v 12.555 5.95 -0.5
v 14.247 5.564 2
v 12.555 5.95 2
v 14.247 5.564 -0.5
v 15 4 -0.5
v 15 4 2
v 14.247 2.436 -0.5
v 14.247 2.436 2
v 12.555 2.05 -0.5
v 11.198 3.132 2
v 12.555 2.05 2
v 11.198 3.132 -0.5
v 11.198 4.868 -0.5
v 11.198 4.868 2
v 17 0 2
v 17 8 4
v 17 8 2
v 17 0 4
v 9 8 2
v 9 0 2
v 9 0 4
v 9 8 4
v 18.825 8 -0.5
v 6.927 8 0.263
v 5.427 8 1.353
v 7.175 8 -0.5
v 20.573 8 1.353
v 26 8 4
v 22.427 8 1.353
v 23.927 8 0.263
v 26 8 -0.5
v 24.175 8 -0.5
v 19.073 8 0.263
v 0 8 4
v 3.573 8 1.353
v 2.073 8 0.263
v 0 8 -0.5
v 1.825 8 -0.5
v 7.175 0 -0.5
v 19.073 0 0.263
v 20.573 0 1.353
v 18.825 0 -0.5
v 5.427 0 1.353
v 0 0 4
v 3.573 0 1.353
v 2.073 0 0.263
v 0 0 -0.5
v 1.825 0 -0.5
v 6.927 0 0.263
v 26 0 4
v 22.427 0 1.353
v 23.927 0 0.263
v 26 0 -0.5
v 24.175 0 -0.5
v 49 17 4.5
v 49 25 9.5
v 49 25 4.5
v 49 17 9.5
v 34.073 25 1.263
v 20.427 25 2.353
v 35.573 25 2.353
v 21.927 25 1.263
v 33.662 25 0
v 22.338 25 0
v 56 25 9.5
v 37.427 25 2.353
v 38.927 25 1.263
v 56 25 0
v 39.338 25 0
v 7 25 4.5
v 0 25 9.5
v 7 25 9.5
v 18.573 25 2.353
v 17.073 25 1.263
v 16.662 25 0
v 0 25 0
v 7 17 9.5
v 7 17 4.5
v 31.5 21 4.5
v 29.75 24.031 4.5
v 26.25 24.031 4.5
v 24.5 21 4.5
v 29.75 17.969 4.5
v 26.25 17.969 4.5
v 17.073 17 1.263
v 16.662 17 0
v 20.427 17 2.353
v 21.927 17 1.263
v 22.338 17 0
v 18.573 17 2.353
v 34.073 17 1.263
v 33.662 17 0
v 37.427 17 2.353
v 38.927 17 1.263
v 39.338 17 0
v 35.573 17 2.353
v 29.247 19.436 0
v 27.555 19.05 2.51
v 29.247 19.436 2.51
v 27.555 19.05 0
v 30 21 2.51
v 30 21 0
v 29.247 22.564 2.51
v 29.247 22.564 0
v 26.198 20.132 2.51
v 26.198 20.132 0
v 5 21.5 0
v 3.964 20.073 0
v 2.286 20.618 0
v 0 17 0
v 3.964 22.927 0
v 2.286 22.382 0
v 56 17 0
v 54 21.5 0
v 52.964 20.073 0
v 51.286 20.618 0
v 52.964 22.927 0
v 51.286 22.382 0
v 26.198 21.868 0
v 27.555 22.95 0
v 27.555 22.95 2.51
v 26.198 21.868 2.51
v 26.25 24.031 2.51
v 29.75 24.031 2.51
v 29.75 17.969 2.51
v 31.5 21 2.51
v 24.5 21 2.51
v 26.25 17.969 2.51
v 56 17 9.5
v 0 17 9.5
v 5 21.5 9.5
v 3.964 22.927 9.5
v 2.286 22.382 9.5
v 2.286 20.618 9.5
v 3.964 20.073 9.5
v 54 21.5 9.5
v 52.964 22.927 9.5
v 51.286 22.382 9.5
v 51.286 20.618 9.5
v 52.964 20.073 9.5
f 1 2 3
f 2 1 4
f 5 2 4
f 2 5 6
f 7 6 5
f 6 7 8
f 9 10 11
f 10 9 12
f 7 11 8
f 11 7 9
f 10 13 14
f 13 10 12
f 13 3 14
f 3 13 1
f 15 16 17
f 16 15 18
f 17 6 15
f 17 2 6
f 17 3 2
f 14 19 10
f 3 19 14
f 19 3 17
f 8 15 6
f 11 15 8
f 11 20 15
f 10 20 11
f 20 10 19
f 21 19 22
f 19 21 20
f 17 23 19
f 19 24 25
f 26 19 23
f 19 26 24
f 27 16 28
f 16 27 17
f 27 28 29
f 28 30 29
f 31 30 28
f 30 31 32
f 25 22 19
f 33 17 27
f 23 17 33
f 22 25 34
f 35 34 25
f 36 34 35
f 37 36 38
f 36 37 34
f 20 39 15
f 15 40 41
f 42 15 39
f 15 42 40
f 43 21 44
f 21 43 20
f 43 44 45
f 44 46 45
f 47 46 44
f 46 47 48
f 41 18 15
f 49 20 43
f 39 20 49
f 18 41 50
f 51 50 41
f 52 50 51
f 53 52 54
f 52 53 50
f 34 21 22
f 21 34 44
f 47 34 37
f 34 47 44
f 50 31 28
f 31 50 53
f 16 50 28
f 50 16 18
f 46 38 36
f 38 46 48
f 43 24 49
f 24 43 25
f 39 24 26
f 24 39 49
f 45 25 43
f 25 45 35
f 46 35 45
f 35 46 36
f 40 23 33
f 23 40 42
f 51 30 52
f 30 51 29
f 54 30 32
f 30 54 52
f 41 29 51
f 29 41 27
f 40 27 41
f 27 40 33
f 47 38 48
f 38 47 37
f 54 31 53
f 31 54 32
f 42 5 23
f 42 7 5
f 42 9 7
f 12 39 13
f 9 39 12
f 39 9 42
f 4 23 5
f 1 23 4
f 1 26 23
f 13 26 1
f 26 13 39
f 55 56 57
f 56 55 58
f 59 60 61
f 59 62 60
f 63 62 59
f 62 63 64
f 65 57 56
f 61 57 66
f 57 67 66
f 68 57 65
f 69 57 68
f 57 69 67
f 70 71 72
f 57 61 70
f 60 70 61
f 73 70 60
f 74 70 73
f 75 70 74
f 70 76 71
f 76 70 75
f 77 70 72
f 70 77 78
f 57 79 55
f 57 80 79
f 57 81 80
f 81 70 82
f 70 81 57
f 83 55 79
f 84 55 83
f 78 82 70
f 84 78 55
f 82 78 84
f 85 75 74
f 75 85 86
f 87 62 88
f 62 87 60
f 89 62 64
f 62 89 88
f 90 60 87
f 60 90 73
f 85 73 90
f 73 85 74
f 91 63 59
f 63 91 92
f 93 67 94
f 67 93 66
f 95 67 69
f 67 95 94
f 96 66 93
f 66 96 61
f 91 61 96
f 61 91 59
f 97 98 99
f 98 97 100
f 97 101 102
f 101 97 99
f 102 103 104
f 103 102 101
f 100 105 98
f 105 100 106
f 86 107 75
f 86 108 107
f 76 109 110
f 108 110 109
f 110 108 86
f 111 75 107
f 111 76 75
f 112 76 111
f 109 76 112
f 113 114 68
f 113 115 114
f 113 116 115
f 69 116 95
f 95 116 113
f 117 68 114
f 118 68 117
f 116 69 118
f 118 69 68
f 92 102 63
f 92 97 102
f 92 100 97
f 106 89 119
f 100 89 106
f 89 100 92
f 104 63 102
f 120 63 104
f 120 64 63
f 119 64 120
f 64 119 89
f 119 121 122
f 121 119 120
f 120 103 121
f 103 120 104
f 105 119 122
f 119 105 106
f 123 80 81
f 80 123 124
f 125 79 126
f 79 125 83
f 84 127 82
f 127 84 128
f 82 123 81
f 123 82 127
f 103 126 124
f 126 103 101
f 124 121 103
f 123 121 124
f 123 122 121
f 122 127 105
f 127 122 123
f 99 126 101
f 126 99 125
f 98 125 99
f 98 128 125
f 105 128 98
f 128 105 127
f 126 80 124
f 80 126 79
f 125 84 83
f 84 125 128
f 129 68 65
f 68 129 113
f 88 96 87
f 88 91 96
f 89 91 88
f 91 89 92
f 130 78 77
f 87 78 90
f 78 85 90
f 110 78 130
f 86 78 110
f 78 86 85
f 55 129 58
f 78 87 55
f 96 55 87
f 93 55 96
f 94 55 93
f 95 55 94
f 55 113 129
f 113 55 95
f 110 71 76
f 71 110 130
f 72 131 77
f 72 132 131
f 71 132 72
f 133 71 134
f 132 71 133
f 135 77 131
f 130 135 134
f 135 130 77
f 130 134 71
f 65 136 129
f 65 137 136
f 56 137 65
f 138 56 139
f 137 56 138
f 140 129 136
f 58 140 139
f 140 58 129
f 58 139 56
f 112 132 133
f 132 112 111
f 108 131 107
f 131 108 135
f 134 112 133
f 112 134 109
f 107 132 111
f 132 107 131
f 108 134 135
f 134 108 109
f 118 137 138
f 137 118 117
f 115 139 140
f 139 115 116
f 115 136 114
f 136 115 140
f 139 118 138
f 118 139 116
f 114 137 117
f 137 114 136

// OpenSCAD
union(){
translate([0,0,-1])
    top(3,3);
translate([0,25,0])
    rotate([90,0,0])
    bottom2(3,2,2,49);
}



screwSize=4;
railWidth=75;
railSize=5;
screwSpace=2;
mountHeight=3;
railBlockLength=railSize+2*screwSpace;
screwAreaLength=screwSize+2*screwSpace;
topLength=2*railBlockLength+screwAreaLength;
mountItemSize=screwAreaLength;


module top(d,l){
    difference(){
        cube([topLength,screwAreaLength,screwAreaLength]);
        union(){
            translate([railBlockLength+screwAreaLength/2,screwAreaLength/2,0])
                cylinder(d=screwSize,h=mountHeight*2);
            
            translate([railBlockLength,0,3])
                cube([screwAreaLength,screwAreaLength,screwAreaLength]);
            
            translate([0,0,5])
                cube([railBlockLength,screwAreaLength,screwAreaLength-1]);
            
            translate([railBlockLength+screwAreaLength,0,5])
                cube([railBlockLength,screwAreaLength,screwAreaLength-1]);
            
            translate([railSize/2+screwSpace,screwAreaLength,-0.5])
                rotate([90,0,0])
                cylinder(d=railSize+1,h=10);
            
            translate([topLength-railSize/2-screwSpace,screwAreaLength,-0.5])
                rotate([90,0,0])
                cylinder(d=railSize+1,h=10);
            
            cube([topLength,screwAreaLength,0.5]);
        }
    }
}

module bottom2(d,l,r,pl){
    
    bl=pl+d+2*l;
    mh=railSize/2+screwSpace;
    
    echo(bl);
    difference(){
        difference(){
            cube([bl,mh+5,screwAreaLength]);
            
            union(){
                           
                
                translate([d+l+r,mh,0])
                    cube([bl-2*(d+l+r),topLength,topLength]);
                
                
                *translate([topLength,mountHeight,0])
                    cube([bl-l-d-r-topLength,topLength,topLength]);
                
                translate([bl/2-screwAreaLength/2-railBlockLength/2,-0.5,0])
                    cylinder(d=railSize+1,h=20);
                
                translate([bl/2+screwAreaLength/2+railBlockLength/2,-0.5,0])
                    cylinder(d=railSize+1,h=20);
                
                *translate([0,mh,screwAreaLength-2])
                    cube([l+d+r,d+l+r+mountHeight,screwAreaLength]);
                
                *translate([bl-l-d-r,mh,screwAreaLength-2])
                    cube([topLength,mountHeight+d+l+r,2]);
                
                *translate([bl-l-d/2,mh+l+d/2,0])
                    rotate([0,0,0])
                        cylinder(d=d,h=40);
                        
                *translate([l+d/2,mh+l+d/2,0])
                    rotate([90,0,0])
                        cylinder(d=d,h=40);
                
                translate([bl/2,mh+1,screwAreaLength/2])
                    rotate([90,0,0])
                        cylinder(d=screwSize,h=mh+1);
                        
                translate([bl/2,mh+.01,screwAreaLength/2])
                    rotate([90,0,0])
                        cylinder(d=3+screwSize,h=mountHeight-1,$fn=6);  
                  
                *translate([r+d/2,mh+2.5,r+d/2])
                    difference(){
                        cube([screwAreaLength,mh+1,screwAreaLength+1],center=true);
                        translate([0,0,0])
                            rotate([90,0,0])
                                //cylinder(d=d+r,h=5,center=true);
                                cube([d+r,d+r,5],center=true);
                    }
                    
                *translate([bl-r-d/2,mh+2.5,r+d/2])
                    difference(){
                        cube([screwAreaLength,mh+1,screwAreaLength+1],center=true);
                        translate([0,0,0])
                            rotate([90,0,0])
                                //cylinder(d=d+r,h=5,center=true);
                                cube([d+r,d+r,5],center=true);
                    }
                
                
            }
        }
        union(){
           translate([l+d/2,4,l+d/2])
            rotate([90,0,0])
            cylinder(d=d,h=7+mh,center=true);
            
            translate([bl-l-d/2,4,l+d/2])
            rotate([90,0,0])
            cylinder(d=d,h=7+mh,center=true);
            
        }
    }
}
